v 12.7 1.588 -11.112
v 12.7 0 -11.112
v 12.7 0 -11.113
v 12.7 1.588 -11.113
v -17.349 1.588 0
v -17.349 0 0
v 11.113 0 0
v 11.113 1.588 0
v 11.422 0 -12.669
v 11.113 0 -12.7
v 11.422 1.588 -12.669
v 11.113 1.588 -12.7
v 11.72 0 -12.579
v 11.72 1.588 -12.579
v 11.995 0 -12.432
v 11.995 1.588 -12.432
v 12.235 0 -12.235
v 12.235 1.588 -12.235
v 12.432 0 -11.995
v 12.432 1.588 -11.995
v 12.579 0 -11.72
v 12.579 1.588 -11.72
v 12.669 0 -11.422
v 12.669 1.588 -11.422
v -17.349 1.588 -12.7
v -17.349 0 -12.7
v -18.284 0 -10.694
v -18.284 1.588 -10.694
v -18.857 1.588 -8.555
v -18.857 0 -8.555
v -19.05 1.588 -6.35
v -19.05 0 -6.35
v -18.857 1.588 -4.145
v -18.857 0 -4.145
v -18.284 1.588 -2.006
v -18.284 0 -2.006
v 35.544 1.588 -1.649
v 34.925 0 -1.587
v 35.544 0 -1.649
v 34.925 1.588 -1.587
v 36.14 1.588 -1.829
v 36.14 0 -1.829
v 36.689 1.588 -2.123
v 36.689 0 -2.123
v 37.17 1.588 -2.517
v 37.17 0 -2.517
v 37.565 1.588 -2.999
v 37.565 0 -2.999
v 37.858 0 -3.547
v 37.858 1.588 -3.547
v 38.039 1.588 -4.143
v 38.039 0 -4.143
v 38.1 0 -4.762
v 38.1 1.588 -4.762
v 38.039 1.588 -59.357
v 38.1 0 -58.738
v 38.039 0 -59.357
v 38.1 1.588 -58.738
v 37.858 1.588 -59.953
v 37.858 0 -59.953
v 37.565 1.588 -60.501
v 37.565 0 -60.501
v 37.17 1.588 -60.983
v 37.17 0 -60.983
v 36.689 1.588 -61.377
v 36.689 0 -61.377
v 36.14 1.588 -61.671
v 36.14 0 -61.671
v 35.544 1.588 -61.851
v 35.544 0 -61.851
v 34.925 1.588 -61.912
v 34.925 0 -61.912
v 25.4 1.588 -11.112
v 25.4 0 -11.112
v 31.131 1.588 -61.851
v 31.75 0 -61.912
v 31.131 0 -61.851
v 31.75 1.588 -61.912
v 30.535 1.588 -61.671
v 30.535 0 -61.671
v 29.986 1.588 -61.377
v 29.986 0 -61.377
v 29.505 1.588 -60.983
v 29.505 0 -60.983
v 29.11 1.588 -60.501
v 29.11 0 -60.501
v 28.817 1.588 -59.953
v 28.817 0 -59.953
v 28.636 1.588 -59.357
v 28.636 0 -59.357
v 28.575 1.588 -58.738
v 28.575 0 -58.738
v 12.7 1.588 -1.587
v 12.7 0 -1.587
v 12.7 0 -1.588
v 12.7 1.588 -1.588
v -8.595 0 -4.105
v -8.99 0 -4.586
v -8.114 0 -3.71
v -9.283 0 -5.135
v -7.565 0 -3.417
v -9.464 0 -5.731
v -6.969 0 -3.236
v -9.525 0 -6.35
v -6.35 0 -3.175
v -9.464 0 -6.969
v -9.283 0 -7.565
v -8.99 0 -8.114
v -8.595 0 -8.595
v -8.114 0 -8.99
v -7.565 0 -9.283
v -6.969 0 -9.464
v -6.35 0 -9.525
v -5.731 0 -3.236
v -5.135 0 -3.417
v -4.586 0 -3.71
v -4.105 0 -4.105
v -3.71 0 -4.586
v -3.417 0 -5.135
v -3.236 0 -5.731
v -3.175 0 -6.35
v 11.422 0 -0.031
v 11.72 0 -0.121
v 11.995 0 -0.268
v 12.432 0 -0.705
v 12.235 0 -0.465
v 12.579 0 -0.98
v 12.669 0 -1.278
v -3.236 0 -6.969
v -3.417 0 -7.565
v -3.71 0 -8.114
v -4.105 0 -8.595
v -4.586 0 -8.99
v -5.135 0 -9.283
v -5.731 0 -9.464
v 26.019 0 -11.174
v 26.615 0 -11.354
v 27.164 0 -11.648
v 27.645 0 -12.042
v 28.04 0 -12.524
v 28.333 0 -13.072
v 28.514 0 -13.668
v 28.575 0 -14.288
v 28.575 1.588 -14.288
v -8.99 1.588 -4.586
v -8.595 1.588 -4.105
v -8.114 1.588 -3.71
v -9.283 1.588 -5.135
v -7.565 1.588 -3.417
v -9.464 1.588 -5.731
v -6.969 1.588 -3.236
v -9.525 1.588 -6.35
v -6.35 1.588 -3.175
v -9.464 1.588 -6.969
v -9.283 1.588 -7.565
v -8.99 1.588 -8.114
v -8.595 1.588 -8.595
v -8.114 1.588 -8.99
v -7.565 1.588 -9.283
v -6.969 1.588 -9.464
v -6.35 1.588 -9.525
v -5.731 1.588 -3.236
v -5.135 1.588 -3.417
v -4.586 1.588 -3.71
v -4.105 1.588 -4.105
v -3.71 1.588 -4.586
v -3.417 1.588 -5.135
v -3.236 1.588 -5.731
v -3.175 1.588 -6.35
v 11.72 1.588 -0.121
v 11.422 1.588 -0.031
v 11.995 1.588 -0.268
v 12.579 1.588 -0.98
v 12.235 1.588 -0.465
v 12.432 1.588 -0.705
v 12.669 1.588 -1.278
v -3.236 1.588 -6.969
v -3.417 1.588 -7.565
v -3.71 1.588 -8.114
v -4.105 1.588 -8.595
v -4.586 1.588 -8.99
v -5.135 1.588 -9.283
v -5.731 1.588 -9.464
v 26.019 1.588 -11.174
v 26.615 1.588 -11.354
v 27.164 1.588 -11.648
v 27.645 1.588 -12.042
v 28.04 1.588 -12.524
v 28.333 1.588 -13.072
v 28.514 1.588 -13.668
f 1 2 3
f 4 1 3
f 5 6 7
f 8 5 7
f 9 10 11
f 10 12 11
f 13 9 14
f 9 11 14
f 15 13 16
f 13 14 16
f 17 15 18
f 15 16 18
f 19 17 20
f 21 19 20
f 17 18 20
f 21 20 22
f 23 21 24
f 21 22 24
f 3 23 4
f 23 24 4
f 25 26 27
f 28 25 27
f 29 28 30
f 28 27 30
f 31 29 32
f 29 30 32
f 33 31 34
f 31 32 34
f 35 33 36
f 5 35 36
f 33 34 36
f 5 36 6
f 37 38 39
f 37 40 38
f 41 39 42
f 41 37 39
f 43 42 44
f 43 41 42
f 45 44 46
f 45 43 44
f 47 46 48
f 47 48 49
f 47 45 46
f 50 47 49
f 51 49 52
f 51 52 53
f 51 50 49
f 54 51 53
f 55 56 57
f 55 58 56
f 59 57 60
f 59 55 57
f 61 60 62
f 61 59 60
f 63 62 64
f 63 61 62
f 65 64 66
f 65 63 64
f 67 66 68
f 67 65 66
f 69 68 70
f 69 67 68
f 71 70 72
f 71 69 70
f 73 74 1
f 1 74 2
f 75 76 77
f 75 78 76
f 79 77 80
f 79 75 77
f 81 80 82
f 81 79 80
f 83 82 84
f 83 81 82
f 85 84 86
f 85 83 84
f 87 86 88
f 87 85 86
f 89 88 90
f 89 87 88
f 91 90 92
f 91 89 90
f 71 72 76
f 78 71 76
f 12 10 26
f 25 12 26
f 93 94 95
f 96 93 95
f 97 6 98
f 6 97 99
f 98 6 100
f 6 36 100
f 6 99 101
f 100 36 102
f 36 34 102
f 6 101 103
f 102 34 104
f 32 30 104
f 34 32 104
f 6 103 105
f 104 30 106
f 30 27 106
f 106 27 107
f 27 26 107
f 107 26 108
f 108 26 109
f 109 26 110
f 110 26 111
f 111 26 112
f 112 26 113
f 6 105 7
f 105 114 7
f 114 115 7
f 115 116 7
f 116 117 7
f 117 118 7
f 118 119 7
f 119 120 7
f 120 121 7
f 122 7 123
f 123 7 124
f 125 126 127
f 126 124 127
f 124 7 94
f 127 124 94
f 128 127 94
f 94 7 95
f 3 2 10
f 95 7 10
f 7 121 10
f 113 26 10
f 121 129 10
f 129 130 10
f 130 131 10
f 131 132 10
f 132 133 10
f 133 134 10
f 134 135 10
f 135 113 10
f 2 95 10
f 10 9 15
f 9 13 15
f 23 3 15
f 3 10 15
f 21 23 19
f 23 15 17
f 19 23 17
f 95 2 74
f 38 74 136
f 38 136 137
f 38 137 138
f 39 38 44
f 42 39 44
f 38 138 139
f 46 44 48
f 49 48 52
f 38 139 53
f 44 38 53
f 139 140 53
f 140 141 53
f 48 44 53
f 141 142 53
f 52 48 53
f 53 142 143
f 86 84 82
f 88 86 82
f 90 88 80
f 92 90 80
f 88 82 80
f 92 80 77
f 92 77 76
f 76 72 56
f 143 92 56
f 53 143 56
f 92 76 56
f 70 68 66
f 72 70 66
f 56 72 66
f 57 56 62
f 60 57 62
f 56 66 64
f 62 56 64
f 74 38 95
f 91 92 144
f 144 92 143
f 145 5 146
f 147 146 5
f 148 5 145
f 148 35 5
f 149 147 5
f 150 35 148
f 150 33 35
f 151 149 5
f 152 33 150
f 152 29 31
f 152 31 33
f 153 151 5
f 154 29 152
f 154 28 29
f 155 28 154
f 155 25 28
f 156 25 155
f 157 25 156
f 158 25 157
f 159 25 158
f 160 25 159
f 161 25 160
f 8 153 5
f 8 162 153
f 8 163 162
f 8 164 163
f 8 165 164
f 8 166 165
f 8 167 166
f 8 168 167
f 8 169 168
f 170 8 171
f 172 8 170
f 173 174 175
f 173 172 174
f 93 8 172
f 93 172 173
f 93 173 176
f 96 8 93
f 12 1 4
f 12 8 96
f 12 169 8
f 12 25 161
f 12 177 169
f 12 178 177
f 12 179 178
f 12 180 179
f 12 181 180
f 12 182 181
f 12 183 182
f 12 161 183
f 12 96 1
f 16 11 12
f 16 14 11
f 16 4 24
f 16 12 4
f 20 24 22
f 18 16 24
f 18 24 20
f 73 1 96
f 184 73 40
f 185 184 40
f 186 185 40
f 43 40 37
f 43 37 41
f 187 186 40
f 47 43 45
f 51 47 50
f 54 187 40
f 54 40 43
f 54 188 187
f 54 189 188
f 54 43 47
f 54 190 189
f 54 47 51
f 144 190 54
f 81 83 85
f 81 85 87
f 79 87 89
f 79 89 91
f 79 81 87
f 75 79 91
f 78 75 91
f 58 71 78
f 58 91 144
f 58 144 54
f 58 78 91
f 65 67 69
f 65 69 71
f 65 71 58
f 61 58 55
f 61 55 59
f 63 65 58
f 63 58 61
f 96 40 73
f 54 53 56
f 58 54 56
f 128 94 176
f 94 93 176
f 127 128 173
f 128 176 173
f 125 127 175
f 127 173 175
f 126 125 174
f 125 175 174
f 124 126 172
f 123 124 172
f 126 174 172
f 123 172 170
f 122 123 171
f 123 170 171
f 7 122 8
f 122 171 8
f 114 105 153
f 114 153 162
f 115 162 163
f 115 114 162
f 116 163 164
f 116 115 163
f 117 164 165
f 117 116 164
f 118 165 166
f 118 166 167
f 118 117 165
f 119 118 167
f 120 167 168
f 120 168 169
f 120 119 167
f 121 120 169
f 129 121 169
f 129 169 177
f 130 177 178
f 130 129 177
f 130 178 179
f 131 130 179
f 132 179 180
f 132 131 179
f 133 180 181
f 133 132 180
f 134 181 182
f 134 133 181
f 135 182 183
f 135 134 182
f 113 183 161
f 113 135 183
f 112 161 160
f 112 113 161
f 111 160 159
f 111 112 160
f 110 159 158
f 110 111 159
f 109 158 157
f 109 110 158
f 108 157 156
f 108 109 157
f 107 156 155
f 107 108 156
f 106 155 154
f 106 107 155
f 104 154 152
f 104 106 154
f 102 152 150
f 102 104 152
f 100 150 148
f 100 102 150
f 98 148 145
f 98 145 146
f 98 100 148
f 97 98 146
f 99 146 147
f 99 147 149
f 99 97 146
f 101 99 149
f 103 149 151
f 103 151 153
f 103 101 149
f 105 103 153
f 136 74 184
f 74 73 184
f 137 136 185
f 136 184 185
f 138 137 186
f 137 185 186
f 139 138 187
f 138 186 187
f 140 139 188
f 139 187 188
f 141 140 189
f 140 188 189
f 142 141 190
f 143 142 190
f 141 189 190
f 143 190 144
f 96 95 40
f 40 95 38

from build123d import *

# Parameters (mm, degrees)
SKETCH1_R           = 3.175
BOSS_EXTRUDE1_DEPTH = 1.5875
FILLET1_R           = 3.175
FILLET2_R           = 1.5875


with BuildPart() as part:
    # Sketch1 → Boss-Extrude1 (new body)
    with BuildSketch(Plane(origin=(0, 0, 0), x_dir=(1, 0, 0), z_dir=(0, 1, 0))):
        with BuildLine():
            Line((-17.348522628, 0), (12.7, 0))
            Line((12.7, 0), (12.7, 1.5875))
            Line((12.7, 1.5875), (38.1, 1.5875))
            Line((38.1, 1.5875), (38.1, 61.9125))
            Line((38.1, 61.9125), (28.575, 61.9125))
            Line((28.575, 61.9125), (28.575, 11.1125))
            Line((28.575, 11.1125), (12.7, 11.1125))
            Line((12.7, 11.1125), (12.7, 12.7))
            Line((12.7, 12.7), (-17.348522628, 12.7))
            ThreePointArc((-17.348522628, 12.7), (-19.05, 6.35), (-17.348522628, 0))
        make_face()
        with Locations(Location((-6.35, 6.35, 0), (0, 0, 270))):
            Circle(SKETCH1_R, mode=Mode.SUBTRACT)
    extrude(amount=BOSS_EXTRUDE1_DEPTH)

    # Fillet1
    fillet1_edges = [part.edges().sort_by_distance(p)[0] for p in [
        (28.575, 0.79375, -11.1125),
        (28.575, 0.79375, -61.9125),
        (38.1, 0.79375, -61.9125),
        (38.1, 0.79375, -1.5875),
    ]]
    fillet(fillet1_edges, radius=FILLET1_R)

    # Fillet2
    fillet2_edges = [part.edges().sort_by_distance(p)[0] for p in [
        (12.7, 0.79375, 0),
        (12.7, 0.79375, -12.7),
    ]]
    fillet(fillet2_edges, radius=FILLET2_R - 0.0001)  # a hair under: the kernel refuses the full size


solid = part.part
